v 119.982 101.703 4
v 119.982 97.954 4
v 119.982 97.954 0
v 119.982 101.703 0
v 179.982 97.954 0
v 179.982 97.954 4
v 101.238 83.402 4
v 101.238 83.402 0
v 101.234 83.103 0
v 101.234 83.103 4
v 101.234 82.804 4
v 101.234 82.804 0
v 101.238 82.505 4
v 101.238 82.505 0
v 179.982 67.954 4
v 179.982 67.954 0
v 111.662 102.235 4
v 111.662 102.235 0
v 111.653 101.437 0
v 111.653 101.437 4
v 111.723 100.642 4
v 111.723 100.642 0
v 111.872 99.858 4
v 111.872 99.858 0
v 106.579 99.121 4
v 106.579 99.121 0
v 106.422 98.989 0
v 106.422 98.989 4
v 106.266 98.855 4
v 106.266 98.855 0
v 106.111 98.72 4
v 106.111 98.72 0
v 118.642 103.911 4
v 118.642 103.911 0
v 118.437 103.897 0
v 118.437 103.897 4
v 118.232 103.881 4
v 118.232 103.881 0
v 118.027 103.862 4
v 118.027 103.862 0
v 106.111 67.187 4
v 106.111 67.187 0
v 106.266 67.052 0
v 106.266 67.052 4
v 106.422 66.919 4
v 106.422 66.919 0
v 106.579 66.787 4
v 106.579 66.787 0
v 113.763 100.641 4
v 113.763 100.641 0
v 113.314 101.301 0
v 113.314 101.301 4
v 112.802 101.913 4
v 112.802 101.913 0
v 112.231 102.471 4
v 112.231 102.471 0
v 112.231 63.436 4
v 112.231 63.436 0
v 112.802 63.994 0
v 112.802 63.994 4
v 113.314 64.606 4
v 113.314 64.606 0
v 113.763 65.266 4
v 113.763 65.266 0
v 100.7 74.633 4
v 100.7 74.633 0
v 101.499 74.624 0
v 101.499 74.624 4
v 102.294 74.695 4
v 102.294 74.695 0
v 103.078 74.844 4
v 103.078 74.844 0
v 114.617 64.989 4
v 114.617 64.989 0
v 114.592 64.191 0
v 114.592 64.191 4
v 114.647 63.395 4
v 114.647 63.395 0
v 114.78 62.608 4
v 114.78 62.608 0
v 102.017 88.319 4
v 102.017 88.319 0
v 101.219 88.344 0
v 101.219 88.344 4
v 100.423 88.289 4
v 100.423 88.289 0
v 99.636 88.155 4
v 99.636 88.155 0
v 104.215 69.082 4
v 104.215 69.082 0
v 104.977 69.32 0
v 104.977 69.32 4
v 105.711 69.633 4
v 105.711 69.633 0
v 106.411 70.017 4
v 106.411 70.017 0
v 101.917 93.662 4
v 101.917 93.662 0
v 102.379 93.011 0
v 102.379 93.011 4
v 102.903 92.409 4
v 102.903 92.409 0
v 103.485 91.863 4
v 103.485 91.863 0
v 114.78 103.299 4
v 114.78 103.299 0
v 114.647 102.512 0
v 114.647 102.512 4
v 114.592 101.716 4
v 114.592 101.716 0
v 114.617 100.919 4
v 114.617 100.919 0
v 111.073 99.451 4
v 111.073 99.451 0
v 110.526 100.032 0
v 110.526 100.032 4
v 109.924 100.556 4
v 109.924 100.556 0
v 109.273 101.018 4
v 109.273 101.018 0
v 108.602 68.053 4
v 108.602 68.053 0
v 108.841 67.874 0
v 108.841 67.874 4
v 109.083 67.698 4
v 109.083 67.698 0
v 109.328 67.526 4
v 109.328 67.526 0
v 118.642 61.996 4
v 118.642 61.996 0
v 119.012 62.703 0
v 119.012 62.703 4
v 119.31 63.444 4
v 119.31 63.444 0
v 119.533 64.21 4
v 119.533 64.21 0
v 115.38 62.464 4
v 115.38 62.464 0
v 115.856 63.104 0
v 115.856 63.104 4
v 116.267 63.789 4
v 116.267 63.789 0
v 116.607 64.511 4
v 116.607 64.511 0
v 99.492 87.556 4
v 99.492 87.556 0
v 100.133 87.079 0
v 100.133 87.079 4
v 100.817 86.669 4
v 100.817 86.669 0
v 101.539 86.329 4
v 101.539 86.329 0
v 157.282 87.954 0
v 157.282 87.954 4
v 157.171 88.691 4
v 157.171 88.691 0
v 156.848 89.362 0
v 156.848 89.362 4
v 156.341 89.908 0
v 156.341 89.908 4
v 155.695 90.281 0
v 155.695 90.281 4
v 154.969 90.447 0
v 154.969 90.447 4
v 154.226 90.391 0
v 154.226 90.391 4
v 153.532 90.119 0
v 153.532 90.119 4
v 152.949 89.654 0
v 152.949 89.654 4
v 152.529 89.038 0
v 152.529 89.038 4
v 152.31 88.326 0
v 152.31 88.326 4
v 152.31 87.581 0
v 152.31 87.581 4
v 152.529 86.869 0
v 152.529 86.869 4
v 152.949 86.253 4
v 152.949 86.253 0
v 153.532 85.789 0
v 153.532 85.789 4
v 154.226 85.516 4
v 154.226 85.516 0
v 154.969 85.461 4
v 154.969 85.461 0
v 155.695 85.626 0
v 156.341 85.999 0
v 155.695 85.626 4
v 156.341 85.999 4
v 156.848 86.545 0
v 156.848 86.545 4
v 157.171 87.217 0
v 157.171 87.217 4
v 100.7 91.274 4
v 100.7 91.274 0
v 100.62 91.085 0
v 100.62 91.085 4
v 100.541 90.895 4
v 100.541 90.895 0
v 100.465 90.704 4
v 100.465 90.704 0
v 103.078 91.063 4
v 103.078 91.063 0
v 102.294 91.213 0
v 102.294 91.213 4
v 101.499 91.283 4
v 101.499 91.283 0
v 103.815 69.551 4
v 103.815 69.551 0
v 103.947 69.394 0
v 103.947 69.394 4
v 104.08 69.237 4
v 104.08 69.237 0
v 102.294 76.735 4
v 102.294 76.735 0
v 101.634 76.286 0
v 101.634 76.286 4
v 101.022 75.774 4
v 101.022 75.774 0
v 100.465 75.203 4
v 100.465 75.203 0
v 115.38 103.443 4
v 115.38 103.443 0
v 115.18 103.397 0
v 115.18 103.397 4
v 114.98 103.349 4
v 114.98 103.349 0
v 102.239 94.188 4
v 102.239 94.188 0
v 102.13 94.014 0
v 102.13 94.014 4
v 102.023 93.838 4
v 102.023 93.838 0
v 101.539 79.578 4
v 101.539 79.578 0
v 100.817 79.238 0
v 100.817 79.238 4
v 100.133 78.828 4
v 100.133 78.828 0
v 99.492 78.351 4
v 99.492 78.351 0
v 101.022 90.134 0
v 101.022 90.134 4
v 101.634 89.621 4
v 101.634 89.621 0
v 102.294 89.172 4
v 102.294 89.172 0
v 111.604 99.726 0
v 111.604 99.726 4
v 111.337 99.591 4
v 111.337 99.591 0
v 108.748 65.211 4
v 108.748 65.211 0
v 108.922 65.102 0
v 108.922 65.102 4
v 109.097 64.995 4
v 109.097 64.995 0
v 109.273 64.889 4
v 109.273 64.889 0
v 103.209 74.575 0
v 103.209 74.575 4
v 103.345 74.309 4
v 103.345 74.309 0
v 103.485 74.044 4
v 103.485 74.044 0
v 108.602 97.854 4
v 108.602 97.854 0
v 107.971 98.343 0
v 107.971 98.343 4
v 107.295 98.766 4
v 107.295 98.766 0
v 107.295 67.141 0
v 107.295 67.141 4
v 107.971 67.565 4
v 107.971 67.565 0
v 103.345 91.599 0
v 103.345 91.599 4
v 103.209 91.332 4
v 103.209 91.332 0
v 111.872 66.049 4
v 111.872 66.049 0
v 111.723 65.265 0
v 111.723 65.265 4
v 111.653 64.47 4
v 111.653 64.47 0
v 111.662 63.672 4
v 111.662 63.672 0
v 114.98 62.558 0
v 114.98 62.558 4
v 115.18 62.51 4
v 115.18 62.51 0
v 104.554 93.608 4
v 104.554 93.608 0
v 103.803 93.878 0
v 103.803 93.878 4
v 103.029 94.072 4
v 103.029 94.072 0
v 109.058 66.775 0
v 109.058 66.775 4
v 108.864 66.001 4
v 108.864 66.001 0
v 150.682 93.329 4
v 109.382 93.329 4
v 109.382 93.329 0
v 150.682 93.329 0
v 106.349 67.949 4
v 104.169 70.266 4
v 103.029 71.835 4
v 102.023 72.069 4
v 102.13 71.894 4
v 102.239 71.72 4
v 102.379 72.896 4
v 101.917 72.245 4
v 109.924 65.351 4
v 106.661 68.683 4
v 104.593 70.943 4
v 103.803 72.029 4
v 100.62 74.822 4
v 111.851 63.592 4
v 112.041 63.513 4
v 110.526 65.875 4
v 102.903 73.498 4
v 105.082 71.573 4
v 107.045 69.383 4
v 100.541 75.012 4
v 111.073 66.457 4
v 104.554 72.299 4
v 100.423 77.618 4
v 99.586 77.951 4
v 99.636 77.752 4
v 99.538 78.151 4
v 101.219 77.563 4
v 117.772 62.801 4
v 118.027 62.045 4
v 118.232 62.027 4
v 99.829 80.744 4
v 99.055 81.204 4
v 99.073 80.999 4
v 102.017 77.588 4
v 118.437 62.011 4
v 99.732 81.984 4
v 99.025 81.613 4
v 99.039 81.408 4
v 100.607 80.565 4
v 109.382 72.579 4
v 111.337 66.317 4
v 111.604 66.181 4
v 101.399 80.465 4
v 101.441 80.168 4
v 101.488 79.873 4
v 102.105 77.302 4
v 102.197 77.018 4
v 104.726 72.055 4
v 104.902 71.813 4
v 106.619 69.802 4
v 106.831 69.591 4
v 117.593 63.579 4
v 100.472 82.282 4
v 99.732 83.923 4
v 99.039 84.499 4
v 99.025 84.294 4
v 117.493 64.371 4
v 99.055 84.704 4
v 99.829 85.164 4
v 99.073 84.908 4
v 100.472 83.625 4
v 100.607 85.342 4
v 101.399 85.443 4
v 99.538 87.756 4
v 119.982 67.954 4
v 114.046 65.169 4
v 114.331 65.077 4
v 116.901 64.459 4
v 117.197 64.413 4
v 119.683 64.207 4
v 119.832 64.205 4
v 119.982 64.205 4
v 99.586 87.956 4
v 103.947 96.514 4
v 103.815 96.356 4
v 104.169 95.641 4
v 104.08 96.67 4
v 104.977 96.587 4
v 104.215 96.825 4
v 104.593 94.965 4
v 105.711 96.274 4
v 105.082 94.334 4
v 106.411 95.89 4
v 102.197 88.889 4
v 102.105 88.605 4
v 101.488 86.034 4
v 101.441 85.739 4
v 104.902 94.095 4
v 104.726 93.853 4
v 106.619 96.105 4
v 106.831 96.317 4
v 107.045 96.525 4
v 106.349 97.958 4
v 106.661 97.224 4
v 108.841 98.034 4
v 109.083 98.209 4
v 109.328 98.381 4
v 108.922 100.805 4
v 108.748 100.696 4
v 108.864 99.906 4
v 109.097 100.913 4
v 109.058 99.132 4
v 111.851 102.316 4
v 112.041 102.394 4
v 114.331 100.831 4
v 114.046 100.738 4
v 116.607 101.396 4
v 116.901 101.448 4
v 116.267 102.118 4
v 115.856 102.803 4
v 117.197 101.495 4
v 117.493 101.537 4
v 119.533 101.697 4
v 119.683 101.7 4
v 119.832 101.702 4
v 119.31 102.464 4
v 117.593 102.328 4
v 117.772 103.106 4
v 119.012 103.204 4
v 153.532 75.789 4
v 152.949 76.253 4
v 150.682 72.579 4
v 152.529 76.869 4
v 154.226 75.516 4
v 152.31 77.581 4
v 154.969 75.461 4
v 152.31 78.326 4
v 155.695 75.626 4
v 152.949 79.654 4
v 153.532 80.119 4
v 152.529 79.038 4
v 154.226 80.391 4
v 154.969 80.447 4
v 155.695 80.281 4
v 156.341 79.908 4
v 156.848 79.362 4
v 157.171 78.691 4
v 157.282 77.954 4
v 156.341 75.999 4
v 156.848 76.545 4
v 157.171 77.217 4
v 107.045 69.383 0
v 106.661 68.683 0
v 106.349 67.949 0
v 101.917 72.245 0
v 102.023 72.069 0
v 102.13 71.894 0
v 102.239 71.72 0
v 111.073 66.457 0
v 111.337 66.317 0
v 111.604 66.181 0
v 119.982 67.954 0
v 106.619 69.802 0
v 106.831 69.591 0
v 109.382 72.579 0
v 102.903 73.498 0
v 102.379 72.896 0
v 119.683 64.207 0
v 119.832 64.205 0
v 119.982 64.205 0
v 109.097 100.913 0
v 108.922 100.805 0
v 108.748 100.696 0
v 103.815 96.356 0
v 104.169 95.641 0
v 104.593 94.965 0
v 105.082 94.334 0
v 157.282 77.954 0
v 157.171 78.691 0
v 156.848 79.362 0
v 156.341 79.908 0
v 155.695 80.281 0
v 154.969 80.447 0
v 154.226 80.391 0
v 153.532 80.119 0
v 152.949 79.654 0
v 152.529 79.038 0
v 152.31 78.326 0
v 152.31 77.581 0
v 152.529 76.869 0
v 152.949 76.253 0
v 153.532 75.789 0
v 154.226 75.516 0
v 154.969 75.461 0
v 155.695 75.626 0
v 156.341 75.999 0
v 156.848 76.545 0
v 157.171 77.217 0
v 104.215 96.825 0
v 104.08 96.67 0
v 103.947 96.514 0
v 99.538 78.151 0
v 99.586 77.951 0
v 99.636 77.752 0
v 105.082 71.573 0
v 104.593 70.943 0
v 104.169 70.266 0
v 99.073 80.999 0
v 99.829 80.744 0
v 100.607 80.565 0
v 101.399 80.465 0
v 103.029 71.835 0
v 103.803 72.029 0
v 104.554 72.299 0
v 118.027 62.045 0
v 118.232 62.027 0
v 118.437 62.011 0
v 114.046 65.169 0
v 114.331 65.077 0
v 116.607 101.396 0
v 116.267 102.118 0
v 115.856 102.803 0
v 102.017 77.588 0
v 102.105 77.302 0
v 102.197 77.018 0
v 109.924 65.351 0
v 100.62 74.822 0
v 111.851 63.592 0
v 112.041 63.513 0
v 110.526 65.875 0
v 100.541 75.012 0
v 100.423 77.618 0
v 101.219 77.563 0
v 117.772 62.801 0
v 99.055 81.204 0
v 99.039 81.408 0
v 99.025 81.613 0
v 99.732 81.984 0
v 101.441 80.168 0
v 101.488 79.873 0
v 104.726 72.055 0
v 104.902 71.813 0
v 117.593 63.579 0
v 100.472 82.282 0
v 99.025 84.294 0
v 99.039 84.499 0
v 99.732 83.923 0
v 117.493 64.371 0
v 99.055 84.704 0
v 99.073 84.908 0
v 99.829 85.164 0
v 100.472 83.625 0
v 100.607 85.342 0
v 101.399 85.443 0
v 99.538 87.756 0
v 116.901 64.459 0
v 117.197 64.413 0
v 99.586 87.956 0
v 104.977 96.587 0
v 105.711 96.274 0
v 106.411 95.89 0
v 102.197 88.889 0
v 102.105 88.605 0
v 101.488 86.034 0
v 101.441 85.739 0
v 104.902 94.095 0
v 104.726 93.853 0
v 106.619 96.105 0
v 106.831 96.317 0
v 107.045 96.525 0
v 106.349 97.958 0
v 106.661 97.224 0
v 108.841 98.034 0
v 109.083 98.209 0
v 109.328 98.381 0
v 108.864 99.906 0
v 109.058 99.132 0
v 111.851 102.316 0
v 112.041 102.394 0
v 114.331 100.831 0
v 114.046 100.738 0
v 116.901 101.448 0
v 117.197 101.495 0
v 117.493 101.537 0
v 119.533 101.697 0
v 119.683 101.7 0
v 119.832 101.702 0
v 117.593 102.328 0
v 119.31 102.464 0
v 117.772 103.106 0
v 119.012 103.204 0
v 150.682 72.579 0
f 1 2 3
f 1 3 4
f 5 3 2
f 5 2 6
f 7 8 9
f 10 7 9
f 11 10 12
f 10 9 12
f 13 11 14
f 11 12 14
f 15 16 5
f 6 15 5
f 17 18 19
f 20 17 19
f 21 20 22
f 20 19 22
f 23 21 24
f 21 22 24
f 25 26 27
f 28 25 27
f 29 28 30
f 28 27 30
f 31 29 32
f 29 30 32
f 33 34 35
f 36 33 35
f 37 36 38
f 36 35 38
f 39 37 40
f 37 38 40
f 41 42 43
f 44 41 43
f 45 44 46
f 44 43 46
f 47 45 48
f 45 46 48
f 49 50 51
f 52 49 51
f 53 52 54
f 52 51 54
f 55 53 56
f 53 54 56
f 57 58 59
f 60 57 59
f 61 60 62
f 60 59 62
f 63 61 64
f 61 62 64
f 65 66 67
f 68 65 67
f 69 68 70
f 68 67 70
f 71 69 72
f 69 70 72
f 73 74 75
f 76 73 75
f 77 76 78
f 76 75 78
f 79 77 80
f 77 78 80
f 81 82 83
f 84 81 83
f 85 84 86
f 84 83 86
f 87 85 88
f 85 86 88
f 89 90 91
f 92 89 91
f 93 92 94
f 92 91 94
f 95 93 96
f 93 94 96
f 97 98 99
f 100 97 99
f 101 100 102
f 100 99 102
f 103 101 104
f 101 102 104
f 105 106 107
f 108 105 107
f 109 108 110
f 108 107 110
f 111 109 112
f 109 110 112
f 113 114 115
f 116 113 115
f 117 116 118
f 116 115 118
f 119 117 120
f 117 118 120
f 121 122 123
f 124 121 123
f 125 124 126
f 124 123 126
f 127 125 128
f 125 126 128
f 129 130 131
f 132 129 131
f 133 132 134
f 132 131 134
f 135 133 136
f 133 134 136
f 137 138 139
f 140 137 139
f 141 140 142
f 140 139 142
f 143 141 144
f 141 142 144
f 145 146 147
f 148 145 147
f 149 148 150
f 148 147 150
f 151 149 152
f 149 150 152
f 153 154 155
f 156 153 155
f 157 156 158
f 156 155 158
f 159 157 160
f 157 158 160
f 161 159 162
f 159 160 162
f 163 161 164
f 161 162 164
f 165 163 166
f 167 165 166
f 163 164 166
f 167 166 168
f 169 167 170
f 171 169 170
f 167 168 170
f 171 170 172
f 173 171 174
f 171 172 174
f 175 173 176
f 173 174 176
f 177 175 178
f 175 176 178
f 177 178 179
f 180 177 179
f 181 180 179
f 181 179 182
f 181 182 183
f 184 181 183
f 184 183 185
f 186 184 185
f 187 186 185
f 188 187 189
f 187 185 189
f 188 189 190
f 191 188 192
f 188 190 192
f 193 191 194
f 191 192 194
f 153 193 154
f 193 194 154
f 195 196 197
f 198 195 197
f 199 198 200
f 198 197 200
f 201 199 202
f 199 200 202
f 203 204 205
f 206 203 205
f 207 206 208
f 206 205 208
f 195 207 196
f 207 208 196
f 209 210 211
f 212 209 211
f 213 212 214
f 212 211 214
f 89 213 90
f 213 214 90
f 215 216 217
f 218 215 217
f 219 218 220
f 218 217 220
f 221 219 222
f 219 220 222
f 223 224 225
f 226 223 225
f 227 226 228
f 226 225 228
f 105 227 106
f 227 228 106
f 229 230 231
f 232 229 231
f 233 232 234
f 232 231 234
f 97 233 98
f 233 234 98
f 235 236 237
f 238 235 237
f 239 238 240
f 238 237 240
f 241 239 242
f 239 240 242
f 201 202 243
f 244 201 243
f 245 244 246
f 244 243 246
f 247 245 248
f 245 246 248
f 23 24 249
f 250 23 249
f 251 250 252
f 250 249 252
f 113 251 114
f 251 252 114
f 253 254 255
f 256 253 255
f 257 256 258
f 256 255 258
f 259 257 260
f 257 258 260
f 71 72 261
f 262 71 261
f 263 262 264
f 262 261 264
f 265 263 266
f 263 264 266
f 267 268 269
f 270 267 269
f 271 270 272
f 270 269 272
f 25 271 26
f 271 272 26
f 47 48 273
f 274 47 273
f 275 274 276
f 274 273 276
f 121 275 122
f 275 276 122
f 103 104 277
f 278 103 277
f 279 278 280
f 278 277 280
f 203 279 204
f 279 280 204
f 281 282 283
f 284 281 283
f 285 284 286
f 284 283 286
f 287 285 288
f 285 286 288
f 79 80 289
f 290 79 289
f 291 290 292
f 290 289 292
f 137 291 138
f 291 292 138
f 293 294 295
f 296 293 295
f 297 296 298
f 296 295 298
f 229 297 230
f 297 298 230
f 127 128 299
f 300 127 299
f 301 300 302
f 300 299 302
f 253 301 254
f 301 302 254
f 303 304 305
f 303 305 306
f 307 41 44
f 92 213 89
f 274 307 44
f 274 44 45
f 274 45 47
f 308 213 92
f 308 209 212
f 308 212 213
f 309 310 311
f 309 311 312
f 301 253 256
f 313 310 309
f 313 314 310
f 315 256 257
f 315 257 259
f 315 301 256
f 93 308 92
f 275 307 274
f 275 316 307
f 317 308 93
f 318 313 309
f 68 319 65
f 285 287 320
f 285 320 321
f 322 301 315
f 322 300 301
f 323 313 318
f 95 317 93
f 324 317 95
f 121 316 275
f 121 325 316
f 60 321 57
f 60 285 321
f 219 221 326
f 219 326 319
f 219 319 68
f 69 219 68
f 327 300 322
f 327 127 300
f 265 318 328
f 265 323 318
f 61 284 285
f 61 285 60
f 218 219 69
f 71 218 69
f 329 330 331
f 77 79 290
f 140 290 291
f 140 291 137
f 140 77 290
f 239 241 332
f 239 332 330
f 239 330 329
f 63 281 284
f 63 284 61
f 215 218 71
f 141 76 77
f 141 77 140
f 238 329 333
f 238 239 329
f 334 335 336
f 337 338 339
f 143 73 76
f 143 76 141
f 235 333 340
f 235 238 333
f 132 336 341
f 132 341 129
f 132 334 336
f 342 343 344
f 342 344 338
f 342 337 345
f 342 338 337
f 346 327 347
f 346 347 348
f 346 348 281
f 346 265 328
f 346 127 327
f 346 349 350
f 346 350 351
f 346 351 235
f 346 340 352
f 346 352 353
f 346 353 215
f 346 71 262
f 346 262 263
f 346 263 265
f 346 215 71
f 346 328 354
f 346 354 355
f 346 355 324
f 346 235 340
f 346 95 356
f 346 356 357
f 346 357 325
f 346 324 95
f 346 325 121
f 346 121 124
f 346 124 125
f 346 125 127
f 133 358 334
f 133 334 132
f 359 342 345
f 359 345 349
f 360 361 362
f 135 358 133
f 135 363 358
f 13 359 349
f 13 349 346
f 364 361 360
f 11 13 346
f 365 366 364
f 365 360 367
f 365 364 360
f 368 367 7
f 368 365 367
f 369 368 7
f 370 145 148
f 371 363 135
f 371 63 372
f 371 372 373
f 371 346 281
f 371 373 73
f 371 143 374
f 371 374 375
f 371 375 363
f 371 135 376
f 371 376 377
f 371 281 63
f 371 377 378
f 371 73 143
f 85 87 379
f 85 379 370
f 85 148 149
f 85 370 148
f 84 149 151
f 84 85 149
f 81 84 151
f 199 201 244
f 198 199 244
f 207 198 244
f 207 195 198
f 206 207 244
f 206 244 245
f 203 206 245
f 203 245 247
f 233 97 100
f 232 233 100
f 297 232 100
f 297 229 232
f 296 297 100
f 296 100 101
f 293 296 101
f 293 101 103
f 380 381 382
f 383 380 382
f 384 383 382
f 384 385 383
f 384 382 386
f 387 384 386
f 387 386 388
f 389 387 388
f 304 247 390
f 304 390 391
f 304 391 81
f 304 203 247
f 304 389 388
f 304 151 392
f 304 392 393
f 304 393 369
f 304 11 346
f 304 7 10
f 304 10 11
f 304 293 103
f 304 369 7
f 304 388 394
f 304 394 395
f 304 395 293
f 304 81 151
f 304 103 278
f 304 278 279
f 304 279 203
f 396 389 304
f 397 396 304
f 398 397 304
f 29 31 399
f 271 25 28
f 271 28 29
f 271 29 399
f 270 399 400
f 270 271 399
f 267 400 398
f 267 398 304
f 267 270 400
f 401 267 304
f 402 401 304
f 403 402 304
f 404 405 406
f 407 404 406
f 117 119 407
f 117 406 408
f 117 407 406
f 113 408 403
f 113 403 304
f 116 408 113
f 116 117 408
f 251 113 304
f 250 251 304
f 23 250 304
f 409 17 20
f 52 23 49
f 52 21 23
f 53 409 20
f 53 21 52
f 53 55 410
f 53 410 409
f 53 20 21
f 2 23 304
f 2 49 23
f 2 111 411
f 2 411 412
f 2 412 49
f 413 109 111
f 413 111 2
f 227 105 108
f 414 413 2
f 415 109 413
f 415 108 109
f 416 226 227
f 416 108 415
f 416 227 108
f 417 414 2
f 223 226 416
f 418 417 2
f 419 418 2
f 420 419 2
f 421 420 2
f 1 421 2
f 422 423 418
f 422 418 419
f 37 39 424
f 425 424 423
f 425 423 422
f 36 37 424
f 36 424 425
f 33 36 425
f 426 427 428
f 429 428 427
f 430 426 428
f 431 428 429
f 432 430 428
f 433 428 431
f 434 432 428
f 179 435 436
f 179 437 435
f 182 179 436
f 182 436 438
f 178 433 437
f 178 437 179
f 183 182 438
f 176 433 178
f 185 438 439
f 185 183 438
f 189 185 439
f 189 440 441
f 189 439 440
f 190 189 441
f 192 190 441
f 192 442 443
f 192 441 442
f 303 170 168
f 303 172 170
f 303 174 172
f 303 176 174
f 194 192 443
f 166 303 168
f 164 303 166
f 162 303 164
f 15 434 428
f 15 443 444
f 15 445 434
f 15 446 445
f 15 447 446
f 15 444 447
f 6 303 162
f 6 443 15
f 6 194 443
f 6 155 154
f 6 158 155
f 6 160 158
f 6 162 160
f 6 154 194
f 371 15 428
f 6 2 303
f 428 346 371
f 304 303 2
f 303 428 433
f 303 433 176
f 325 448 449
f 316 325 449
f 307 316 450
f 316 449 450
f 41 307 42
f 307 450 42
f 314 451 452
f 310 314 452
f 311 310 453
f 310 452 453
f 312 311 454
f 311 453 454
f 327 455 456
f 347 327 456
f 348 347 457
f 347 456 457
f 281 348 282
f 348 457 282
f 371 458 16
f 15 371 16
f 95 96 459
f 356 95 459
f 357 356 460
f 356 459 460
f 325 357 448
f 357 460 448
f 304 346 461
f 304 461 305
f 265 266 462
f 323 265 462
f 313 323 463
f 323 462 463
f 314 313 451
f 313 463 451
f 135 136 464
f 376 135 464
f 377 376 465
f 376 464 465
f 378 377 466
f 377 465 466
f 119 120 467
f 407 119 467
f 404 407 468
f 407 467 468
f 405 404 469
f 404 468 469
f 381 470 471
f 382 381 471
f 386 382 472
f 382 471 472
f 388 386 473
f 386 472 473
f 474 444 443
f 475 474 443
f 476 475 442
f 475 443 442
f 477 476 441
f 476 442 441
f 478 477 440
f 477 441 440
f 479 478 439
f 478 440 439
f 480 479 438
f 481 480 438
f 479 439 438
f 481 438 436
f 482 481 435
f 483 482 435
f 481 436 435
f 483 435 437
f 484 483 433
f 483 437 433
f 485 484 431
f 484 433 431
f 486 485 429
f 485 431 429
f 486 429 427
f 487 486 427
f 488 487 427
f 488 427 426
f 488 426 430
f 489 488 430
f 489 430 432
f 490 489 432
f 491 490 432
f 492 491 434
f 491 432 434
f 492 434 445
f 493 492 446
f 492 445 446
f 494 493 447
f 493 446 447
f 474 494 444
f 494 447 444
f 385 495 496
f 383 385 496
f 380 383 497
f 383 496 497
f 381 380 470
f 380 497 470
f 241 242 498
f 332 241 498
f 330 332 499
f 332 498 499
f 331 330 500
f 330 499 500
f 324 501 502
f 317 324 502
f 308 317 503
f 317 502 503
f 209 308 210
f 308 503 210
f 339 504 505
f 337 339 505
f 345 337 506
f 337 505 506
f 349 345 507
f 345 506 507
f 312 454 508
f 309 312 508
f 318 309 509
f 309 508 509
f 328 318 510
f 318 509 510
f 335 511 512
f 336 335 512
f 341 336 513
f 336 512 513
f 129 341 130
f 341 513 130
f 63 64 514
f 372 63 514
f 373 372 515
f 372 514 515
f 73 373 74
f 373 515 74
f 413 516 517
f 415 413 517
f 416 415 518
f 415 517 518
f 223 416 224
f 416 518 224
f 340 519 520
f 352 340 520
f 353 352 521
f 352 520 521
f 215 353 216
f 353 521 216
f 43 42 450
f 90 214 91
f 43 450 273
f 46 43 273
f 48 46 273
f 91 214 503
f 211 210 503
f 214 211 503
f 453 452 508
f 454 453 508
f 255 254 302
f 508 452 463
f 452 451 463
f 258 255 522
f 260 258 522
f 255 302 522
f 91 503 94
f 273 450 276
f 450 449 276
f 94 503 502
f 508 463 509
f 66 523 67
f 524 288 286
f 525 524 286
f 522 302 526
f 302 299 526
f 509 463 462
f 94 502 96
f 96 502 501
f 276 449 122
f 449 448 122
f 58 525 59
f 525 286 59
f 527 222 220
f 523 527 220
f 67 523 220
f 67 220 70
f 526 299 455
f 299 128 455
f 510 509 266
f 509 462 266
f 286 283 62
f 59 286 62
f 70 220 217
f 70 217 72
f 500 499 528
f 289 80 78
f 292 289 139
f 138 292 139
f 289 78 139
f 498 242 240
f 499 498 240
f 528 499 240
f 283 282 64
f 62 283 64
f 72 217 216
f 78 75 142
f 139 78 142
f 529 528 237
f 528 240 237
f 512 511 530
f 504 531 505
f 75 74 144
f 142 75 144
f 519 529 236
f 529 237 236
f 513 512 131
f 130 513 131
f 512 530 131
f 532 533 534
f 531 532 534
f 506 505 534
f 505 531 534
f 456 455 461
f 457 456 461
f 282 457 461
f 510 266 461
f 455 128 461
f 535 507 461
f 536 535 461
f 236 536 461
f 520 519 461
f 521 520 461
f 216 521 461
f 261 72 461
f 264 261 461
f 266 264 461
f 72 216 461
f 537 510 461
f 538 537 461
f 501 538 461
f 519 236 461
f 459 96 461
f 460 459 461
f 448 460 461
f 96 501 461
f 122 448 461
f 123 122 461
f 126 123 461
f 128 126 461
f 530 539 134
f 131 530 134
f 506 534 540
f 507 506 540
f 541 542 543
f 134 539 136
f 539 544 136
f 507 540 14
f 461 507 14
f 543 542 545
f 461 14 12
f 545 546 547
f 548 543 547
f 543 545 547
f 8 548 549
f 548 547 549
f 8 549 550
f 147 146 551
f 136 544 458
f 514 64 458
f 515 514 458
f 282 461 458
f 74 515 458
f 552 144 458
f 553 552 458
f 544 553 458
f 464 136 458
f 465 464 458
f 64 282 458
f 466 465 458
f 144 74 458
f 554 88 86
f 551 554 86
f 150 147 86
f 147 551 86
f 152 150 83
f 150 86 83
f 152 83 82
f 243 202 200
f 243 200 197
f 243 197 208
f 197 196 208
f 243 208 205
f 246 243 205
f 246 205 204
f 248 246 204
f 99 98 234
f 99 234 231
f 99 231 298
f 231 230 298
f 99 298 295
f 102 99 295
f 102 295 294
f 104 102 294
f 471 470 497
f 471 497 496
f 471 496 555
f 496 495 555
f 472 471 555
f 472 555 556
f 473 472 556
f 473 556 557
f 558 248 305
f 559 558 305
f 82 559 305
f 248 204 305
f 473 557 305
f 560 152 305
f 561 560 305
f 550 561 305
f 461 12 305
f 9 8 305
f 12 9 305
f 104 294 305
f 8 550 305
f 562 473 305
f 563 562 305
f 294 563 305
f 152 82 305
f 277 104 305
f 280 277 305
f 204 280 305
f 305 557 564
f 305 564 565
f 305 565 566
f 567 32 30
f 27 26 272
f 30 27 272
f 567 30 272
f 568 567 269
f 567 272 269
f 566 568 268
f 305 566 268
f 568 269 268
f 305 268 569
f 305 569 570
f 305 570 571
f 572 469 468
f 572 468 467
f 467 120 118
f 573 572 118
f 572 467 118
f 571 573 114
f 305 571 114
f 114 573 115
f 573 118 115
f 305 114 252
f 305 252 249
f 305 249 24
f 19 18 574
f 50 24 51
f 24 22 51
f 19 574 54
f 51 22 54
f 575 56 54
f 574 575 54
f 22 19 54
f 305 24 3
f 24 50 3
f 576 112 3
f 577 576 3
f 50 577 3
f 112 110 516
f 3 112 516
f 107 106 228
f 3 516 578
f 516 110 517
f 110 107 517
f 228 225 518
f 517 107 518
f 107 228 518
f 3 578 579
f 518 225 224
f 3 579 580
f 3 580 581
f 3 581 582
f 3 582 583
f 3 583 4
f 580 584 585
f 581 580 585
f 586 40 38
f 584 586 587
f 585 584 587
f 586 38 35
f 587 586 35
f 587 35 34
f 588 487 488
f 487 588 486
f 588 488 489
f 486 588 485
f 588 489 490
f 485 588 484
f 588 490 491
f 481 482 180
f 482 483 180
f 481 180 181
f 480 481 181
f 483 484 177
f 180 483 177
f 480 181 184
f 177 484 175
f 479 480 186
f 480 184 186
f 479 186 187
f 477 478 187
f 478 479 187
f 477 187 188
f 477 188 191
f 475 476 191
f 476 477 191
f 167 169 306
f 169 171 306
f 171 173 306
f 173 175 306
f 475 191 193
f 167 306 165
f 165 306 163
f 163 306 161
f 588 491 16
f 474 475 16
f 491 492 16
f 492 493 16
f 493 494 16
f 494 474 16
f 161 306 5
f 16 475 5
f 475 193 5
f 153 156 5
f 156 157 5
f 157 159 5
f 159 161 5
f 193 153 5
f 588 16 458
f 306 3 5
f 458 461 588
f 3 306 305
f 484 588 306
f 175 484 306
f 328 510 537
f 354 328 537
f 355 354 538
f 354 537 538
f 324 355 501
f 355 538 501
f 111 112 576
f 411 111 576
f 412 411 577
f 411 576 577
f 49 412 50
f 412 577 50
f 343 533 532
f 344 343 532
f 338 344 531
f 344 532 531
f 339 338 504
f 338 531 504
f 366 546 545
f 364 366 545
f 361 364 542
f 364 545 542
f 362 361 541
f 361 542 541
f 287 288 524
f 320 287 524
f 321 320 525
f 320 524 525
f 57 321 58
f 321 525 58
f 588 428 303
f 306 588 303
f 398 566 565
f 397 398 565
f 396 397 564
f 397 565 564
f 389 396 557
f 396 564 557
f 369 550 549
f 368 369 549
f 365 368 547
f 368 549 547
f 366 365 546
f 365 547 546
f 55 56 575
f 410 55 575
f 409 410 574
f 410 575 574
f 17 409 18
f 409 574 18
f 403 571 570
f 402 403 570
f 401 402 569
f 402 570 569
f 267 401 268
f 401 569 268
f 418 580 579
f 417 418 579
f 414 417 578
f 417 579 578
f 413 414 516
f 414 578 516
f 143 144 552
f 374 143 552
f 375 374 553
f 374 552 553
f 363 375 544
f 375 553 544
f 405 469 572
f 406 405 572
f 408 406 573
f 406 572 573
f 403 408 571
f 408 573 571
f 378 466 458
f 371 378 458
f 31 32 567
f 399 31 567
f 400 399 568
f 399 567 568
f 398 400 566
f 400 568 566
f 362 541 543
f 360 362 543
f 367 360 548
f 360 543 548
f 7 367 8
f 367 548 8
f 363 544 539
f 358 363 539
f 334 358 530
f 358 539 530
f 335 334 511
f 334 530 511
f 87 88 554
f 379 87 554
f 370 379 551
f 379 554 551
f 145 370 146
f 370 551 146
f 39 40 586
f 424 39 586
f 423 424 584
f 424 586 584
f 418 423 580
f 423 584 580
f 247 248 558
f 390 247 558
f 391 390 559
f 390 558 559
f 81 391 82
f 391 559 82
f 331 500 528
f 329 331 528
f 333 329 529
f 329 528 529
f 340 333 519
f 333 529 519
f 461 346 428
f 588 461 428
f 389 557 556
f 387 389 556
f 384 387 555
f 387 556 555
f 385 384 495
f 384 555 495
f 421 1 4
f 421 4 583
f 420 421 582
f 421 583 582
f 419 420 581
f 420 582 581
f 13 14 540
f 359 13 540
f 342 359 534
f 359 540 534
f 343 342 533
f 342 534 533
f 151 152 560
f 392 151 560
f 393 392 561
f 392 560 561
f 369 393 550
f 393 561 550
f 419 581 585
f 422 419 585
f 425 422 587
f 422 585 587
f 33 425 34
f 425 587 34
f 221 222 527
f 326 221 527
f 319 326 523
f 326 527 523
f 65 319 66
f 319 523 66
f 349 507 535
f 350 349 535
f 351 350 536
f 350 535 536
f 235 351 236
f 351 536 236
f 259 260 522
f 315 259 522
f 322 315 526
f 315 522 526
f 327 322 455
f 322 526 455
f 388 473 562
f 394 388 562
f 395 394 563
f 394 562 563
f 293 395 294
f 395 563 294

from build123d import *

# Parameters (mm, degrees)
MODEL_R             = 2.5
BOSS_EXTRUDE1_DEPTH = 4
SKETCH3_W           = 38.015783353
SKETCH3_H           = 48.473012512
CUT_EXTRUDE1_DEPTH  = 4
SKETCH4_W           = 60
SKETCH4_H           = 30
BOSS_EXTRUDE2_DEPTH = 4
SKETCH7_W           = 41.3
SKETCH7_H           = 20.75
CUT_EXTRUDE2_DEPTH  = 4
SKETCH8_R           = 2.5
CUT_EXTRUDE3_DEPTH  = 4


with BuildPart() as part:
    # Model → Boss-Extrude1 (new body)
    with BuildSketch(Plane.XY):
        with BuildLine():
            ThreePointArc((99.073084966, 84.908336321), (99.046651001, 84.60128395), (99.024725946, 84.293876719))
            ThreePointArc((99.024725946, 84.293876719), (100.098074623, 83.765095558), (101.23828427, 83.402316207))
            ThreePointArc((101.23828427, 83.402316207), (101.232915009, 82.953642939), (101.23828427, 82.504969672))
            ThreePointArc((101.23828427, 82.504969672), (100.098074623, 82.14219032), (99.024725946, 81.61340916))
            ThreePointArc((99.024725946, 81.61340916), (99.046651001, 81.306001929), (99.073084966, 80.998949557))
            ThreePointArc((99.073084966, 80.998949557), (100.215938537, 80.644587296), (101.398861505, 80.464642447))
            ThreePointArc((101.398861505, 80.464642447), (101.463746311, 80.020653154), (101.53923743, 79.578343736))
            ThreePointArc((101.53923743, 79.578343736), (100.469816849, 79.041662715), (99.492402474, 78.351483002))
            ThreePointArc((99.492402474, 78.351483002), (99.562146681, 78.051290298), (99.636288773, 77.752153434))
            ThreePointArc((99.636288773, 77.752153434), (100.820506391, 77.580935647), (102.017015191, 77.58825614))
            ThreePointArc((102.017015191, 77.58825614), (102.150556385, 77.159883312), (102.29431052, 76.734828869))
            ThreePointArc((102.29431052, 76.734828869), (101.32201169, 76.037461045), (100.464598802, 75.202877295))
            ThreePointArc((100.464598802, 75.202877295), (100.580444826, 74.91729086), (100.700469422, 74.633435245))
            ThreePointArc((100.700469422, 74.633435245), (101.896891719, 74.649577883), (103.077524332, 74.843983462))
            ThreePointArc((103.077524332, 74.843983462), (103.276433687, 74.44177506), (103.484911134, 74.044441844))
            ThreePointArc((103.484911134, 74.044441844), (102.633675279, 73.203558728), (101.917376229, 72.245121162))
            ThreePointArc((101.917376229, 72.245121162), (102.076471558, 71.98117308), (102.239423252, 71.719588183))
            ThreePointArc((102.239423252, 71.719588183), (103.41859034, 71.92269376), (104.554275675, 72.299397515))
            ThreePointArc((104.554275675, 72.299397515), (104.813655381, 71.933257244), (105.081722734, 71.573428918))
            ThreePointArc((105.081722734, 71.573428918), (104.372510105, 70.609735842), (103.814962553, 69.551044374))
            ThreePointArc((103.814962553, 69.551044374), (104.013389731, 69.315233924), (104.215256114, 69.082360832))
            ThreePointArc((104.215256114, 69.082360832), (105.348132986, 69.467428215), (106.410906699, 70.017154449))
            ThreePointArc((106.410906699, 70.017154449), (106.724369968, 69.696097899), (107.045426519, 69.382634629))
            ThreePointArc((107.045426519, 69.382634629), (106.495700285, 68.319860916), (106.110632902, 67.186984044))
            ThreePointArc((106.110632902, 67.186984044), (106.343505994, 66.985117662), (106.579316444, 66.786690483))
            ThreePointArc((106.579316444, 66.786690483), (107.638007912, 67.344238035), (108.601700987, 68.053450665))
            ThreePointArc((108.601700987, 68.053450665), (108.961529314, 67.785383312), (109.327669584, 67.526003605))
            ThreePointArc((109.327669584, 67.526003605), (108.95096583, 66.390318271), (108.747860253, 65.211151183))
            ThreePointArc((108.747860253, 65.211151183), (109.00944515, 65.048199488), (109.273393232, 64.889104159))
            ThreePointArc((109.273393232, 64.889104159), (110.231830798, 65.605403209), (111.072713914, 66.456639064))
            ThreePointArc((111.072713914, 66.456639064), (111.470047129, 66.248161617), (111.872255531, 66.049252262))
            ThreePointArc((111.872255531, 66.049252262), (111.677849953, 64.868619649), (111.661707315, 63.672197352))
            ThreePointArc((111.661707315, 63.672197352), (111.945562929, 63.552172756), (112.231149365, 63.436326732))
            ThreePointArc((112.231149365, 63.436326732), (113.065733115, 64.29373962), (113.763100939, 65.26603845))
            ThreePointArc((113.763100939, 65.26603845), (114.188155381, 65.122284315), (114.616528209, 64.988743121))
            ThreePointArc((114.616528209, 64.988743121), (114.609207717, 63.792234321), (114.780425504, 62.608016704))
            ThreePointArc((114.780425504, 62.608016704), (115.079562368, 62.533874611), (115.379755071, 62.464130405))
            ThreePointArc((115.379755071, 62.464130405), (116.069934785, 63.44154478), (116.606615806, 64.51096536))
            ThreePointArc((116.606615806, 64.51096536), (117.048925224, 64.435474242), (117.492914517, 64.370589435))
            ThreePointArc((117.492914517, 64.370589435), (117.672859366, 63.187666467), (118.027221627, 62.044812896))
            ThreePointArc((118.027221627, 62.044812896), (118.334273999, 62.018378931), (118.641681229, 61.996453876))
            ThreePointArc((118.641681229, 61.996453876), (119.17046239, 63.069802553), (119.533241741, 64.2100122))
            ThreePointArc((119.533241741, 64.2100122), (119.981915009, 64.204642939), (120.430588277, 64.2100122))
            ThreePointArc((120.430588277, 64.2100122), (120.793367628, 63.069802553), (121.322148789, 61.996453876))
            ThreePointArc((121.322148789, 61.996453876), (121.629556019, 62.018378931), (121.936608391, 62.044812896))
            ThreePointArc((121.936608391, 62.044812896), (122.290970652, 63.187666467), (122.470915501, 64.370589435))
            ThreePointArc((122.470915501, 64.370589435), (122.914904794, 64.435474242), (123.357214212, 64.51096536))
            ThreePointArc((123.357214212, 64.51096536), (123.893895234, 63.44154478), (124.584074947, 62.464130405))
            ThreePointArc((124.584074947, 62.464130405), (124.88426765, 62.533874611), (125.183404514, 62.608016704))
            ThreePointArc((125.183404514, 62.608016704), (125.354622301, 63.792234321), (125.347301809, 64.988743121))
            ThreePointArc((125.347301809, 64.988743121), (125.775674637, 65.122284315), (126.200729079, 65.26603845))
            ThreePointArc((126.200729079, 65.26603845), (126.898096903, 64.29373962), (127.732680653, 63.436326732))
            ThreePointArc((127.732680653, 63.436326732), (128.018267089, 63.552172757), (128.302122703, 63.672197352))
            ThreePointArc((128.302122703, 63.672197352), (128.285980065, 64.868619649), (128.091574487, 66.049252262))
            ThreePointArc((128.091574487, 66.049252262), (128.493782889, 66.248161617), (128.891116104, 66.456639065))
            ThreePointArc((128.891116104, 66.456639065), (129.73199922, 65.605403209), (130.690436786, 64.889104159))
            ThreePointArc((130.690436786, 64.889104159), (130.954384868, 65.048199488), (131.215969765, 65.211151183))
            ThreePointArc((131.215969765, 65.211151183), (131.012864188, 66.390318271), (130.636160434, 67.526003605))
            ThreePointArc((130.636160434, 67.526003605), (131.002300704, 67.785383312), (131.362129031, 68.053450665))
            ThreePointArc((131.362129031, 68.053450665), (132.325822106, 67.344238036), (133.384513574, 66.786690483))
            ThreePointArc((133.384513574, 66.786690483), (133.620324024, 66.985117662), (133.853197116, 67.186984044))
            ThreePointArc((133.853197116, 67.186984044), (133.468129733, 68.319860916), (132.918403499, 69.382634629))
            ThreePointArc((132.918403499, 69.382634629), (133.23946005, 69.696097899), (133.552923319, 70.01715445))
            ThreePointArc((133.552923319, 70.01715445), (134.615697032, 69.467428215), (135.748573904, 69.082360832))
            ThreePointArc((135.748573904, 69.082360832), (135.950440287, 69.315233924), (136.148867465, 69.551044374))
            ThreePointArc((136.148867465, 69.551044374), (135.591319913, 70.609735842), (134.882107284, 71.573428918))
            ThreePointArc((134.882107284, 71.573428918), (135.150174637, 71.933257244), (135.409554343, 72.299397515))
            ThreePointArc((135.409554343, 72.299397515), (136.545239678, 71.92269376), (137.724406766, 71.719588183))
            ThreePointArc((137.724406766, 71.719588183), (137.88735846, 71.98117308), (138.046453789, 72.245121162))
            ThreePointArc((138.046453789, 72.245121162), (137.330154739, 73.203558728), (136.478918884, 74.044441844))
            ThreePointArc((136.478918884, 74.044441844), (136.687396331, 74.44177506), (136.886305686, 74.843983462))
            ThreePointArc((136.886305686, 74.843983462), (138.066938299, 74.649577883), (139.263360596, 74.633435245))
            ThreePointArc((139.263360596, 74.633435245), (139.383385192, 74.91729086), (139.499231216, 75.202877295))
            ThreePointArc((139.499231216, 75.202877295), (138.641818328, 76.037461045), (137.669519498, 76.73482887))
            ThreePointArc((137.669519498, 76.73482887), (137.813273633, 77.159883312), (137.946814828, 77.58825614))
            ThreePointArc((137.946814828, 77.58825614), (139.143323627, 77.580935647), (140.327541245, 77.752153434))
            ThreePointArc((140.327541245, 77.752153434), (140.401683337, 78.051290298), (140.471427544, 78.351483002))
            ThreePointArc((140.471427544, 78.351483002), (139.494013169, 79.041662715), (138.424592588, 79.578343736))
            ThreePointArc((138.424592588, 79.578343736), (138.500083707, 80.020653154), (138.564968513, 80.464642447))
            ThreePointArc((138.564968513, 80.464642447), (139.747891481, 80.644587296), (140.890745052, 80.998949557))
            ThreePointArc((140.890745052, 80.998949557), (140.917179017, 81.306001929), (140.939104072, 81.61340916))
            ThreePointArc((140.939104072, 81.61340916), (139.865755396, 82.14219032), (138.725545749, 82.504969672))
            ThreePointArc((138.725545749, 82.504969672), (138.730915009, 82.953642939), (138.725545749, 83.402316207))
            ThreePointArc((138.725545749, 83.402316207), (139.865755396, 83.765095558), (140.939104072, 84.293876719))
            ThreePointArc((140.939104072, 84.293876719), (140.917179017, 84.60128395), (140.890745052, 84.908336321))
            ThreePointArc((140.890745052, 84.908336321), (139.747891481, 85.262698582), (138.564968514, 85.442643432))
            ThreePointArc((138.564968514, 85.442643432), (138.500083707, 85.886632724), (138.424592588, 86.328942142))
            ThreePointArc((138.424592588, 86.328942142), (139.494013169, 86.865623164), (140.471427544, 87.555802877))
            ThreePointArc((140.471427544, 87.555802877), (140.401683337, 87.85599558), (140.327541245, 88.155132445))
            ThreePointArc((140.327541245, 88.155132445), (139.143323627, 88.326350231), (137.946814828, 88.319029739))
            ThreePointArc((137.946814828, 88.319029739), (137.813273633, 88.747402567), (137.669519498, 89.172457009))
            ThreePointArc((137.669519498, 89.172457009), (138.641818328, 89.869824833), (139.499231216, 90.704408584))
            ThreePointArc((139.499231216, 90.704408584), (139.383385192, 90.989995019), (139.263360596, 91.273850633))
            ThreePointArc((139.263360596, 91.273850633), (138.066938299, 91.257707996), (136.886305686, 91.063302417))
            ThreePointArc((136.886305686, 91.063302417), (136.687396331, 91.465510819), (136.478918884, 91.862844035))
            ThreePointArc((136.478918884, 91.862844035), (137.330154739, 92.703727151), (138.046453789, 93.662164717))
            ThreePointArc((138.046453789, 93.662164717), (137.88735846, 93.926112798), (137.724406766, 94.187697696))
            ThreePointArc((137.724406766, 94.187697696), (136.545239678, 93.984592119), (135.409554344, 93.607888364))
            ThreePointArc((135.409554344, 93.607888364), (135.150174637, 93.974028635), (134.882107284, 94.333856961))
            ThreePointArc((134.882107284, 94.333856961), (135.591319913, 95.297550036), (136.148867465, 96.356241504))
            ThreePointArc((136.148867465, 96.356241504), (135.950440287, 96.592051954), (135.748573904, 96.824925046))
            ThreePointArc((135.748573904, 96.824925046), (134.615697032, 96.439857663), (133.552923319, 95.890131429))
            ThreePointArc((133.552923319, 95.890131429), (133.23946005, 96.21118798), (132.918403499, 96.524651249))
            ThreePointArc((132.918403499, 96.524651249), (133.468129733, 97.587424962), (133.853197116, 98.720301834))
            ThreePointArc((133.853197116, 98.720301834), (133.620324024, 98.922168217), (133.384513574, 99.120595395))
            ThreePointArc((133.384513574, 99.120595395), (132.325822106, 98.563047843), (131.362129031, 97.853835214))
            ThreePointArc((131.362129031, 97.853835214), (131.002300704, 98.121902567), (130.636160434, 98.381282274))
            ThreePointArc((130.636160434, 98.381282274), (131.012864188, 99.516967608), (131.215969765, 100.696134696))
            ThreePointArc((131.215969765, 100.696134696), (130.954384868, 100.859086391), (130.690436786, 101.01818172))
            ThreePointArc((130.690436786, 101.01818172), (129.73199922, 100.30188267), (128.891116104, 99.450646814))
            ThreePointArc((128.891116104, 99.450646814), (128.493782889, 99.659124261), (128.091574487, 99.858033616))
            ThreePointArc((128.091574487, 99.858033616), (128.285980065, 101.03866623), (128.302122703, 102.235088526))
            ThreePointArc((128.302122703, 102.235088526), (128.018267089, 102.355113122), (127.732680653, 102.470959146))
            ThreePointArc((127.732680653, 102.470959146), (126.898096903, 101.613546259), (126.200729079, 100.641247429))
            ThreePointArc((126.200729079, 100.641247429), (125.775674637, 100.785001563), (125.347301809, 100.918542758))
            ThreePointArc((125.347301809, 100.918542758), (125.354622301, 102.115051557), (125.183404514, 103.299269175))
            ThreePointArc((125.183404514, 103.299269175), (124.88426765, 103.373411268), (124.584074947, 103.443155474))
            ThreePointArc((124.584074947, 103.443155474), (123.893895234, 102.465741099), (123.357214212, 101.396320519))
            ThreePointArc((123.357214212, 101.396320519), (122.914904794, 101.471811637), (122.470915501, 101.536696444))
            ThreePointArc((122.470915501, 101.536696444), (122.290970652, 102.719619412), (121.936608391, 103.862472983))
            ThreePointArc((121.936608391, 103.862472983), (121.629556019, 103.888906948), (121.322148789, 103.910832002))
            ThreePointArc((121.322148789, 103.910832002), (120.793367628, 102.837483326), (120.430588277, 101.697273679))
            ThreePointArc((120.430588277, 101.697273679), (119.981915009, 101.702642939), (119.533241741, 101.697273679))
            ThreePointArc((119.533241741, 101.697273679), (119.17046239, 102.837483326), (118.641681229, 103.910832002))
            ThreePointArc((118.641681229, 103.910832002), (118.334273999, 103.888906948), (118.027221627, 103.862472983))
            ThreePointArc((118.027221627, 103.862472983), (117.672859366, 102.719619412), (117.492914517, 101.536696444))
            ThreePointArc((117.492914517, 101.536696444), (117.048925224, 101.471811637), (116.606615806, 101.396320519))
            ThreePointArc((116.606615806, 101.396320519), (116.069934785, 102.465741099), (115.379755071, 103.443155474))
            ThreePointArc((115.379755071, 103.443155474), (115.079562368, 103.373411268), (114.780425504, 103.299269175))
            ThreePointArc((114.780425504, 103.299269175), (114.609207717, 102.115051557), (114.616528209, 100.918542758))
            ThreePointArc((114.616528209, 100.918542758), (114.188155382, 100.785001563), (113.763100939, 100.641247428))
            ThreePointArc((113.763100939, 100.641247428), (113.065733115, 101.613546258), (112.231149365, 102.470959146))
            ThreePointArc((112.231149365, 102.470959146), (111.945562929, 102.355113122), (111.661707315, 102.235088526))
            ThreePointArc((111.661707315, 102.235088526), (111.677849953, 101.03866623), (111.872255532, 99.858033616))
            ThreePointArc((111.872255532, 99.858033616), (111.470047129, 99.659124261), (111.072713914, 99.450646814))
            ThreePointArc((111.072713914, 99.450646814), (110.231830798, 100.30188267), (109.273393232, 101.018181719))
            ThreePointArc((109.273393232, 101.018181719), (109.00944515, 100.859086391), (108.747860253, 100.696134696))
            ThreePointArc((108.747860253, 100.696134696), (108.95096583, 99.516967608), (109.327669585, 98.381282274))
            ThreePointArc((109.327669585, 98.381282274), (108.961529314, 98.121902567), (108.601700987, 97.853835214))
            ThreePointArc((108.601700987, 97.853835214), (107.638007912, 98.563047843), (106.579316444, 99.120595395))
            ThreePointArc((106.579316444, 99.120595395), (106.343505994, 98.922168217), (106.110632902, 98.720301834))
            ThreePointArc((106.110632902, 98.720301834), (106.495700285, 97.587424962), (107.045426519, 96.524651249))
            ThreePointArc((107.045426519, 96.524651249), (106.724369969, 96.21118798), (106.410906699, 95.890131429))
            ThreePointArc((106.410906699, 95.890131429), (105.348132986, 96.439857663), (104.215256114, 96.824925046))
            ThreePointArc((104.215256114, 96.824925046), (104.013389732, 96.592051954), (103.814962553, 96.356241504))
            ThreePointArc((103.814962553, 96.356241504), (104.372510105, 95.297550036), (105.081722735, 94.333856961))
            ThreePointArc((105.081722735, 94.333856961), (104.813655382, 93.974028635), (104.554275675, 93.607888364))
            ThreePointArc((104.554275675, 93.607888364), (103.418590341, 93.984592119), (102.239423253, 94.187697696))
            ThreePointArc((102.239423253, 94.187697696), (102.076471558, 93.926112798), (101.917376229, 93.662164717))
            ThreePointArc((101.917376229, 93.662164717), (102.633675279, 92.703727151), (103.484911134, 91.862844034))
            ThreePointArc((103.484911134, 91.862844034), (103.276433687, 91.465510819), (103.077524332, 91.063302417))
            ThreePointArc((103.077524332, 91.063302417), (101.896891719, 91.257707996), (100.700469422, 91.273850633))
            ThreePointArc((100.700469422, 91.273850633), (100.580444826, 90.989995019), (100.464598802, 90.704408584))
            ThreePointArc((100.464598802, 90.704408584), (101.32201169, 89.869824833), (102.29431052, 89.172457009))
            ThreePointArc((102.29431052, 89.172457009), (102.150556385, 88.747402567), (102.017015191, 88.319029739))
            ThreePointArc((102.017015191, 88.319029739), (100.820506391, 88.326350231), (99.636288773, 88.155132445))
            ThreePointArc((99.636288773, 88.155132445), (99.562146681, 87.85599558), (99.492402474, 87.555802877))
            ThreePointArc((99.492402474, 87.555802877), (100.469816849, 86.865623164), (101.53923743, 86.328942142))
            ThreePointArc((101.53923743, 86.328942142), (101.463746311, 85.886632724), (101.398861505, 85.442643432))
            ThreePointArc((101.398861505, 85.442643432), (100.215938537, 85.262698582), (99.073084966, 84.908336321))
        make_face()
        with Locations((119.981915009, 82.953642939)):
            Circle(MODEL_R, mode=Mode.SUBTRACT)
    extrude(amount=BOSS_EXTRUDE1_DEPTH)

    # Sketch3 → Cut-Extrude1 (cut)
    with BuildSketch(Plane.XY.offset(4)):
        with Locations((138.989806686, 82.953642939)):
            Rectangle(SKETCH3_W, SKETCH3_H)
    extrude(amount=-CUT_EXTRUDE1_DEPTH, mode=Mode.SUBTRACT)

    # Sketch4 → Boss-Extrude2 (add)
    with BuildSketch(Plane.XY):
        with Locations((149.981915009, 82.953642939)):
            Rectangle(SKETCH4_W, SKETCH4_H)
    extrude(amount=BOSS_EXTRUDE2_DEPTH)

    # Sketch7 → Cut-Extrude2 (cut)
    with BuildSketch(Plane.XY.offset(4)):
        with Locations((130.031915009, 82.953642939)):
            Rectangle(SKETCH7_W, SKETCH7_H)
    extrude(amount=-CUT_EXTRUDE2_DEPTH, mode=Mode.SUBTRACT)

    # Sketch8 → Cut-Extrude3 (cut)
    with BuildSketch(Plane.XY.offset(4)):
        with Locations((154.781915009, 77.953642939)):
            Circle(SKETCH8_R)
        with Locations((154.781915009, 87.953642939)):
            Circle(SKETCH8_R)
    extrude(amount=-CUT_EXTRUDE3_DEPTH, mode=Mode.SUBTRACT)


solid = part.part
